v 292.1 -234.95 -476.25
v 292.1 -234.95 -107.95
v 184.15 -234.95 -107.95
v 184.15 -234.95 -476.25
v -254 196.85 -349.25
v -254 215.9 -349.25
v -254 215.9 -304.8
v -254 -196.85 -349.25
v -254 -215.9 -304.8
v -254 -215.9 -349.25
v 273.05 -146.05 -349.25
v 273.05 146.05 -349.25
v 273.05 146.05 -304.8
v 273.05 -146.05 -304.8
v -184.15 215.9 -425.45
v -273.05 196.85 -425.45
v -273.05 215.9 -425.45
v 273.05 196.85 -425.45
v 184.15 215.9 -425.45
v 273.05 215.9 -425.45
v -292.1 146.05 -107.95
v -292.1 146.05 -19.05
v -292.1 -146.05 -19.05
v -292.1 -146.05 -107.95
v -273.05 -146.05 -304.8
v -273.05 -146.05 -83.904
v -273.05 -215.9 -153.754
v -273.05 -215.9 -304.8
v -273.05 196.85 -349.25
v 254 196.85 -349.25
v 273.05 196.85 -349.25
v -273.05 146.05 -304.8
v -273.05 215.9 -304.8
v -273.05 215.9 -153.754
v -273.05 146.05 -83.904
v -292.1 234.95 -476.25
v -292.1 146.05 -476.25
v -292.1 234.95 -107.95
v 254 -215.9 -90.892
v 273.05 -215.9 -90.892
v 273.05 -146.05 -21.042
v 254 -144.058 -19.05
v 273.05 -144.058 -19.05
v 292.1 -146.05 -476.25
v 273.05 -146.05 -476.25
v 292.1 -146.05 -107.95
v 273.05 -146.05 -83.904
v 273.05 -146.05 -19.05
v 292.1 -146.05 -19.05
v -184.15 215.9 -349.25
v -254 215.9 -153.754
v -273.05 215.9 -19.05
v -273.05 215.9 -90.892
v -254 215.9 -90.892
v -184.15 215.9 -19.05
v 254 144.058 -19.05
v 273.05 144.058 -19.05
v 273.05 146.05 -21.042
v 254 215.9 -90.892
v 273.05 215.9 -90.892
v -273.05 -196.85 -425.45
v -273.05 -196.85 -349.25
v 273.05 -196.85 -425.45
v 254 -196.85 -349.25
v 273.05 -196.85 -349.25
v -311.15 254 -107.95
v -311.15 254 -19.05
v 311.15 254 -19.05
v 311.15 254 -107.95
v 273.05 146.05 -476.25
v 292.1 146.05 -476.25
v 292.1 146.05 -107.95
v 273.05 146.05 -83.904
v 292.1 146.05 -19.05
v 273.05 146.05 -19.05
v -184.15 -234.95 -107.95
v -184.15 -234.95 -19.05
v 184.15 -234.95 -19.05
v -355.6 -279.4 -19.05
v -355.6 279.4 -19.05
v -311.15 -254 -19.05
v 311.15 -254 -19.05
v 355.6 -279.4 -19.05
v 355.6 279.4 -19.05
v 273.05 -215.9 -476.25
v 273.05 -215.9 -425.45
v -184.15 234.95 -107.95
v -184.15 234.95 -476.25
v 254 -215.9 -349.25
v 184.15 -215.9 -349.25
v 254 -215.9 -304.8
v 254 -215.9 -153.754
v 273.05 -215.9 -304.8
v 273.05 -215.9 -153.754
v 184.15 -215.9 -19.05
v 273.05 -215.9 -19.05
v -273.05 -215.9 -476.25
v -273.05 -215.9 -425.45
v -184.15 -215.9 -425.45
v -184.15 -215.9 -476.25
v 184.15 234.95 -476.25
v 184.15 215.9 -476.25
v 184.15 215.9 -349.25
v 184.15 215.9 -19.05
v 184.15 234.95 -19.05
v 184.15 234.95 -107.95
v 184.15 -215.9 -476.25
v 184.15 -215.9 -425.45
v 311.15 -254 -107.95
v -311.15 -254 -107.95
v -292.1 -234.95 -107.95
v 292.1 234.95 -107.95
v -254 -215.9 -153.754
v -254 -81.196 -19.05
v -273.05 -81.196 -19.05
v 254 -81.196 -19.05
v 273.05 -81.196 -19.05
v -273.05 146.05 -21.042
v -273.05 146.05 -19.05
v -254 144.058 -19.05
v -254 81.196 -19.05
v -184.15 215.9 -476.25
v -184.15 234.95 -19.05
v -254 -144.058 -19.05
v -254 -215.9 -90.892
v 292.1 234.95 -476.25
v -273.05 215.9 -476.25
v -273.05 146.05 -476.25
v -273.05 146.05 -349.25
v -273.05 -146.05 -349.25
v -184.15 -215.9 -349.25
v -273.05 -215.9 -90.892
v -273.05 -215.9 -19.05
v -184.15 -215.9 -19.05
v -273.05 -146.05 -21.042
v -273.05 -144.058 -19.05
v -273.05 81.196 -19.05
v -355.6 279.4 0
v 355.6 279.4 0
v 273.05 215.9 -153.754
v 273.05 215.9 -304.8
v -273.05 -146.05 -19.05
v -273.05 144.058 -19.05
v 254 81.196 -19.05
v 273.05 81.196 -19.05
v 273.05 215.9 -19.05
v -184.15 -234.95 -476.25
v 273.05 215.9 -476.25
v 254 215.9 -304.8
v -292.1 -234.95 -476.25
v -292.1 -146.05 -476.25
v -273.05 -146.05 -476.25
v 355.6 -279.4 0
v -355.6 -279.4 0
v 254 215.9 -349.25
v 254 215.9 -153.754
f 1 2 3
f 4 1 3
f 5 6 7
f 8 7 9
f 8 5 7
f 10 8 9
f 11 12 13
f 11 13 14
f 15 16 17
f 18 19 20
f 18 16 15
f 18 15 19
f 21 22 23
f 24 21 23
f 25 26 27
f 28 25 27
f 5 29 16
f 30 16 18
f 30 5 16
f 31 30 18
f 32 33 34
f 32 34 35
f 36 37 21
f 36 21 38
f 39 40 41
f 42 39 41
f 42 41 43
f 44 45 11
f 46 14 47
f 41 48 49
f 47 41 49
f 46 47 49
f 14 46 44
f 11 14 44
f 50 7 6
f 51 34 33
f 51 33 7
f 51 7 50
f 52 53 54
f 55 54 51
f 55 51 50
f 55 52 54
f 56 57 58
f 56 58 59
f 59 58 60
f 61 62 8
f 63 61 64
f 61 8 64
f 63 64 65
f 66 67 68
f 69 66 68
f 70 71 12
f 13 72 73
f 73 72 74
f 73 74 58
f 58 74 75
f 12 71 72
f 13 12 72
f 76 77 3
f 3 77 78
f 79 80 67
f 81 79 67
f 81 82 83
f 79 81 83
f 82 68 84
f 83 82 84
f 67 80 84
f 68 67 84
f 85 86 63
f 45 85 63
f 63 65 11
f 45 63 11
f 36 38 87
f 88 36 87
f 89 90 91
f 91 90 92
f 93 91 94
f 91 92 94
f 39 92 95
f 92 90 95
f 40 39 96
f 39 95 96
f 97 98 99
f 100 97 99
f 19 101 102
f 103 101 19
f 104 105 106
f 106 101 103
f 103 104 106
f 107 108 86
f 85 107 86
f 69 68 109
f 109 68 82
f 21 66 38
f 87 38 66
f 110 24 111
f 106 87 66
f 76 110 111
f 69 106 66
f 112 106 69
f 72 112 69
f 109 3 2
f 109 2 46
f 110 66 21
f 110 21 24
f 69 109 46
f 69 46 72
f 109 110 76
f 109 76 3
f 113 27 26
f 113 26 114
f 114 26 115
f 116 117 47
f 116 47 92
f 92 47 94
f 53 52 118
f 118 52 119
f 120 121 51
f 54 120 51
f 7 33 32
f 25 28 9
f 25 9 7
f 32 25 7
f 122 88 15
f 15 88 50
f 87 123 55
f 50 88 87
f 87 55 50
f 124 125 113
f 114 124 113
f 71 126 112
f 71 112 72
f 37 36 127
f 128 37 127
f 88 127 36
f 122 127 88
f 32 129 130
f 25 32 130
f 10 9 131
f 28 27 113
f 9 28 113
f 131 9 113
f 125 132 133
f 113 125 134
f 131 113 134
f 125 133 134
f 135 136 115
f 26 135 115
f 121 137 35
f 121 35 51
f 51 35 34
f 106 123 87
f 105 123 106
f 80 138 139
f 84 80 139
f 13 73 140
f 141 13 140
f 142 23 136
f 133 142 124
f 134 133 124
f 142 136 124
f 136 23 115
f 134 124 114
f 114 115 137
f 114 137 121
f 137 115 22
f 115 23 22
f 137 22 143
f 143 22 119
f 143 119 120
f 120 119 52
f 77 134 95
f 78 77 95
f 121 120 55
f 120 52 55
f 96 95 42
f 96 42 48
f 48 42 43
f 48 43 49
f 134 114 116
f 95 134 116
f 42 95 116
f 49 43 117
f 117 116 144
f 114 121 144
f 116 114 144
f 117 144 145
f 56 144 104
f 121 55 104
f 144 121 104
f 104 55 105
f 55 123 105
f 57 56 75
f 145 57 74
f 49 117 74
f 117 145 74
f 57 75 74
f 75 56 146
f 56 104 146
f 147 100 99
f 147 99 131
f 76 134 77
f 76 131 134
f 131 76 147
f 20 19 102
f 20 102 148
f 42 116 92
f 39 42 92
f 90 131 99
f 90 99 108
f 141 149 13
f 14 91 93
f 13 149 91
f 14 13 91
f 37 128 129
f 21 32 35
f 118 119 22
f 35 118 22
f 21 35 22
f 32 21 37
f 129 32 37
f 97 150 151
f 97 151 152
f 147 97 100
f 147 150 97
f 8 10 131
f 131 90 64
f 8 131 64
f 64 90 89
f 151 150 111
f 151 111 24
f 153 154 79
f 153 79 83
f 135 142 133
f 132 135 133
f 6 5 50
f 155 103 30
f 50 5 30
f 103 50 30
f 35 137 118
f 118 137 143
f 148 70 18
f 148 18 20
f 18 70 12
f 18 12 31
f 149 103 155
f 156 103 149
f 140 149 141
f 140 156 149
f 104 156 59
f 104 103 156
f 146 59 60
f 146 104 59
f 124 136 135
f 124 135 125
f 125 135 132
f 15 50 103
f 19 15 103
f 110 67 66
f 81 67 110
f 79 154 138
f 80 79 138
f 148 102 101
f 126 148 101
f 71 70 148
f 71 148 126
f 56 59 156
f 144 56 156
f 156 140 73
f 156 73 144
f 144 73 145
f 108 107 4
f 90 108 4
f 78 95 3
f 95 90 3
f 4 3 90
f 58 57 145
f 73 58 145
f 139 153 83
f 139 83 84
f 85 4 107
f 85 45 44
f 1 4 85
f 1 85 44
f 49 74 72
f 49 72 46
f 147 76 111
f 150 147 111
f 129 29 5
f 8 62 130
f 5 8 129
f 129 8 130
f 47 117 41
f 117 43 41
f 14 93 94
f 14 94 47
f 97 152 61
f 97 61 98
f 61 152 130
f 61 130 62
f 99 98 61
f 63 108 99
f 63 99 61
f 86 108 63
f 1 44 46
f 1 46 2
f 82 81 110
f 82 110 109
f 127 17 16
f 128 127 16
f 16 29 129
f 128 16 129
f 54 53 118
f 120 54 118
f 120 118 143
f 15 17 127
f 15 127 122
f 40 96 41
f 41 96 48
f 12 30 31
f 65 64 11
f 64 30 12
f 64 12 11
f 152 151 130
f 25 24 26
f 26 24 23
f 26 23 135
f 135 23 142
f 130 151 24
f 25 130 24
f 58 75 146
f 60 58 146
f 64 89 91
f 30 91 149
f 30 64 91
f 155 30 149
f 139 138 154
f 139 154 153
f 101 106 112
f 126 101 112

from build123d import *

# Parameters (mm, degrees)
F0_W      = 711.2
F0_H      = 558.8
F1_DEPTH  = 19.05
F2_W      = 622.3
F2_H      = 19.05
F3_DEPTH  = 88.9
F4_W      = 19.05
F4_H      = 469.9
F5_DEPTH  = 88.9
F6_W      = 88.9
F6_H      = 19.05
F7_DEPTH  = 457.2
F9_W      = 546.1
F9_H      = 19.05
F10_DEPTH = 76.2
F11_W     = 19.05
F11_H     = 431.8
F12_DEPTH = 44.45
F14_DEPTH = 19.05
F16_DEPTH = 19.05


with BuildPart() as f1:
    # F0 (on Top) → F1 (new body)
    with BuildSketch(Plane.XY):
        Rectangle(F0_W, F0_H)
    extrude(amount=-F1_DEPTH)

    # F2 (on face) → F3 (join)
    with BuildSketch(Plane(origin=(0, 0, -19.05), x_dir=(1, 0, 0), z_dir=(0, 0, -1))):
        with Locations((0, 244.475)):
            Rectangle(F2_W, F2_H)
        with Locations((0, -244.475)):
            Rectangle(F2_W, F2_H)
    extrude(amount=F3_DEPTH)

    # F4 (on face) → F5 (join)
    with BuildSketch(Plane(origin=(0, 0, -19.05), x_dir=(1, 0, 0), z_dir=(0, 0, -1))):
        with Locations((-301.625, 0)):
            Rectangle(F4_W, F4_H)
        with Locations((301.625, 0)):
            Rectangle(F4_W, F4_H)
    extrude(amount=F5_DEPTH)

    # F6 (on face) → F7 (join)
    with BuildSketch(Plane(origin=(0, 0, -19.05), x_dir=(1, 0, 0), z_dir=(0, 0, -1))):
        Polygon((-273.05, 234.95), (-292.1, 234.95), (-292.1, 146.05), (-273.05, 146.05), (-273.05, 215.9), align=None)
        with Locations((-228.6, 225.425)):
            Rectangle(F6_W, F6_H)
        Polygon((292.1, 184.15), (292.1, 234.95), (273.05, 234.95), (273.05, 215.9), (273.05, 146.05), (292.1, 146.05), align=None)
        with Locations((228.6, 225.425)):
            Rectangle(F6_W, F6_H)
        Polygon((273.05, -234.95), (292.1, -234.95), (292.1, -184.15), (292.1, -146.05), (273.05, -146.05), (273.05, -215.9), align=None)
        with Locations((228.6, -225.425)):
            Rectangle(F6_W, F6_H)
        Polygon((-292.1, -146.05), (-292.1, -234.95), (-273.05, -234.95), (-273.05, -215.9), (-273.05, -146.05), align=None)
        with Locations((-228.6, -225.425)):
            Rectangle(F6_W, F6_H)
    extrude(amount=F7_DEPTH)

    # F9 (on face) → F10 (join)
    with BuildSketch(Plane(origin=(0, 0, -349.25), x_dir=(1, 0, 0), z_dir=(0, 0, -1))):
        with Locations((0, -206.375)):
            Rectangle(F9_W, F9_H)
        with Locations((0, 206.375)):
            Rectangle(F9_W, F9_H)
    extrude(amount=F10_DEPTH)

    # F11 (on face) → F12 (join)
    with BuildSketch(Plane(origin=(0, 0, -349.25), x_dir=(1, 0, 0), z_dir=(0, 0, -1))):
        Polygon((254, -215.9), (273.05, -215.9), (273.05, 215.9), (254, 215.9), (254, 0), align=None)
        with Locations((-263.525, 0)):
            Rectangle(F11_W, F11_H)
    extrude(amount=-F12_DEPTH)

    # F13 (on face) → F14 (join)
    with BuildSketch(Plane(origin=(273.05, 0, 0), x_dir=(0, -1, 0), z_dir=(-1, 0, 0))):
        Polygon((-144.0579510314, -19.05), (-215.9, -90.8920489686), (-215.9, -153.753841816), (-81.196158184, -19.05), align=None)
        Polygon((215.9, -153.753841816), (215.9, -90.8920489686), (144.0579510314, -19.05), (81.196158184, -19.05), align=None)
    extrude(amount=F14_DEPTH)

    # F15 (on face) → F16 (join)
    with BuildSketch(Plane.YZ.offset(-273.05)):
        Polygon((-144.0579510314, -19.05), (-215.9, -90.8920489686), (-215.9, -153.753841816), (-81.196158184, -19.05), align=None)
        Polygon((144.0579510314, -19.05), (81.196158184, -19.05), (215.9, -153.753841816), (215.9, -90.8920489686), align=None)
    extrude(amount=F16_DEPTH)


solid = f1.part
